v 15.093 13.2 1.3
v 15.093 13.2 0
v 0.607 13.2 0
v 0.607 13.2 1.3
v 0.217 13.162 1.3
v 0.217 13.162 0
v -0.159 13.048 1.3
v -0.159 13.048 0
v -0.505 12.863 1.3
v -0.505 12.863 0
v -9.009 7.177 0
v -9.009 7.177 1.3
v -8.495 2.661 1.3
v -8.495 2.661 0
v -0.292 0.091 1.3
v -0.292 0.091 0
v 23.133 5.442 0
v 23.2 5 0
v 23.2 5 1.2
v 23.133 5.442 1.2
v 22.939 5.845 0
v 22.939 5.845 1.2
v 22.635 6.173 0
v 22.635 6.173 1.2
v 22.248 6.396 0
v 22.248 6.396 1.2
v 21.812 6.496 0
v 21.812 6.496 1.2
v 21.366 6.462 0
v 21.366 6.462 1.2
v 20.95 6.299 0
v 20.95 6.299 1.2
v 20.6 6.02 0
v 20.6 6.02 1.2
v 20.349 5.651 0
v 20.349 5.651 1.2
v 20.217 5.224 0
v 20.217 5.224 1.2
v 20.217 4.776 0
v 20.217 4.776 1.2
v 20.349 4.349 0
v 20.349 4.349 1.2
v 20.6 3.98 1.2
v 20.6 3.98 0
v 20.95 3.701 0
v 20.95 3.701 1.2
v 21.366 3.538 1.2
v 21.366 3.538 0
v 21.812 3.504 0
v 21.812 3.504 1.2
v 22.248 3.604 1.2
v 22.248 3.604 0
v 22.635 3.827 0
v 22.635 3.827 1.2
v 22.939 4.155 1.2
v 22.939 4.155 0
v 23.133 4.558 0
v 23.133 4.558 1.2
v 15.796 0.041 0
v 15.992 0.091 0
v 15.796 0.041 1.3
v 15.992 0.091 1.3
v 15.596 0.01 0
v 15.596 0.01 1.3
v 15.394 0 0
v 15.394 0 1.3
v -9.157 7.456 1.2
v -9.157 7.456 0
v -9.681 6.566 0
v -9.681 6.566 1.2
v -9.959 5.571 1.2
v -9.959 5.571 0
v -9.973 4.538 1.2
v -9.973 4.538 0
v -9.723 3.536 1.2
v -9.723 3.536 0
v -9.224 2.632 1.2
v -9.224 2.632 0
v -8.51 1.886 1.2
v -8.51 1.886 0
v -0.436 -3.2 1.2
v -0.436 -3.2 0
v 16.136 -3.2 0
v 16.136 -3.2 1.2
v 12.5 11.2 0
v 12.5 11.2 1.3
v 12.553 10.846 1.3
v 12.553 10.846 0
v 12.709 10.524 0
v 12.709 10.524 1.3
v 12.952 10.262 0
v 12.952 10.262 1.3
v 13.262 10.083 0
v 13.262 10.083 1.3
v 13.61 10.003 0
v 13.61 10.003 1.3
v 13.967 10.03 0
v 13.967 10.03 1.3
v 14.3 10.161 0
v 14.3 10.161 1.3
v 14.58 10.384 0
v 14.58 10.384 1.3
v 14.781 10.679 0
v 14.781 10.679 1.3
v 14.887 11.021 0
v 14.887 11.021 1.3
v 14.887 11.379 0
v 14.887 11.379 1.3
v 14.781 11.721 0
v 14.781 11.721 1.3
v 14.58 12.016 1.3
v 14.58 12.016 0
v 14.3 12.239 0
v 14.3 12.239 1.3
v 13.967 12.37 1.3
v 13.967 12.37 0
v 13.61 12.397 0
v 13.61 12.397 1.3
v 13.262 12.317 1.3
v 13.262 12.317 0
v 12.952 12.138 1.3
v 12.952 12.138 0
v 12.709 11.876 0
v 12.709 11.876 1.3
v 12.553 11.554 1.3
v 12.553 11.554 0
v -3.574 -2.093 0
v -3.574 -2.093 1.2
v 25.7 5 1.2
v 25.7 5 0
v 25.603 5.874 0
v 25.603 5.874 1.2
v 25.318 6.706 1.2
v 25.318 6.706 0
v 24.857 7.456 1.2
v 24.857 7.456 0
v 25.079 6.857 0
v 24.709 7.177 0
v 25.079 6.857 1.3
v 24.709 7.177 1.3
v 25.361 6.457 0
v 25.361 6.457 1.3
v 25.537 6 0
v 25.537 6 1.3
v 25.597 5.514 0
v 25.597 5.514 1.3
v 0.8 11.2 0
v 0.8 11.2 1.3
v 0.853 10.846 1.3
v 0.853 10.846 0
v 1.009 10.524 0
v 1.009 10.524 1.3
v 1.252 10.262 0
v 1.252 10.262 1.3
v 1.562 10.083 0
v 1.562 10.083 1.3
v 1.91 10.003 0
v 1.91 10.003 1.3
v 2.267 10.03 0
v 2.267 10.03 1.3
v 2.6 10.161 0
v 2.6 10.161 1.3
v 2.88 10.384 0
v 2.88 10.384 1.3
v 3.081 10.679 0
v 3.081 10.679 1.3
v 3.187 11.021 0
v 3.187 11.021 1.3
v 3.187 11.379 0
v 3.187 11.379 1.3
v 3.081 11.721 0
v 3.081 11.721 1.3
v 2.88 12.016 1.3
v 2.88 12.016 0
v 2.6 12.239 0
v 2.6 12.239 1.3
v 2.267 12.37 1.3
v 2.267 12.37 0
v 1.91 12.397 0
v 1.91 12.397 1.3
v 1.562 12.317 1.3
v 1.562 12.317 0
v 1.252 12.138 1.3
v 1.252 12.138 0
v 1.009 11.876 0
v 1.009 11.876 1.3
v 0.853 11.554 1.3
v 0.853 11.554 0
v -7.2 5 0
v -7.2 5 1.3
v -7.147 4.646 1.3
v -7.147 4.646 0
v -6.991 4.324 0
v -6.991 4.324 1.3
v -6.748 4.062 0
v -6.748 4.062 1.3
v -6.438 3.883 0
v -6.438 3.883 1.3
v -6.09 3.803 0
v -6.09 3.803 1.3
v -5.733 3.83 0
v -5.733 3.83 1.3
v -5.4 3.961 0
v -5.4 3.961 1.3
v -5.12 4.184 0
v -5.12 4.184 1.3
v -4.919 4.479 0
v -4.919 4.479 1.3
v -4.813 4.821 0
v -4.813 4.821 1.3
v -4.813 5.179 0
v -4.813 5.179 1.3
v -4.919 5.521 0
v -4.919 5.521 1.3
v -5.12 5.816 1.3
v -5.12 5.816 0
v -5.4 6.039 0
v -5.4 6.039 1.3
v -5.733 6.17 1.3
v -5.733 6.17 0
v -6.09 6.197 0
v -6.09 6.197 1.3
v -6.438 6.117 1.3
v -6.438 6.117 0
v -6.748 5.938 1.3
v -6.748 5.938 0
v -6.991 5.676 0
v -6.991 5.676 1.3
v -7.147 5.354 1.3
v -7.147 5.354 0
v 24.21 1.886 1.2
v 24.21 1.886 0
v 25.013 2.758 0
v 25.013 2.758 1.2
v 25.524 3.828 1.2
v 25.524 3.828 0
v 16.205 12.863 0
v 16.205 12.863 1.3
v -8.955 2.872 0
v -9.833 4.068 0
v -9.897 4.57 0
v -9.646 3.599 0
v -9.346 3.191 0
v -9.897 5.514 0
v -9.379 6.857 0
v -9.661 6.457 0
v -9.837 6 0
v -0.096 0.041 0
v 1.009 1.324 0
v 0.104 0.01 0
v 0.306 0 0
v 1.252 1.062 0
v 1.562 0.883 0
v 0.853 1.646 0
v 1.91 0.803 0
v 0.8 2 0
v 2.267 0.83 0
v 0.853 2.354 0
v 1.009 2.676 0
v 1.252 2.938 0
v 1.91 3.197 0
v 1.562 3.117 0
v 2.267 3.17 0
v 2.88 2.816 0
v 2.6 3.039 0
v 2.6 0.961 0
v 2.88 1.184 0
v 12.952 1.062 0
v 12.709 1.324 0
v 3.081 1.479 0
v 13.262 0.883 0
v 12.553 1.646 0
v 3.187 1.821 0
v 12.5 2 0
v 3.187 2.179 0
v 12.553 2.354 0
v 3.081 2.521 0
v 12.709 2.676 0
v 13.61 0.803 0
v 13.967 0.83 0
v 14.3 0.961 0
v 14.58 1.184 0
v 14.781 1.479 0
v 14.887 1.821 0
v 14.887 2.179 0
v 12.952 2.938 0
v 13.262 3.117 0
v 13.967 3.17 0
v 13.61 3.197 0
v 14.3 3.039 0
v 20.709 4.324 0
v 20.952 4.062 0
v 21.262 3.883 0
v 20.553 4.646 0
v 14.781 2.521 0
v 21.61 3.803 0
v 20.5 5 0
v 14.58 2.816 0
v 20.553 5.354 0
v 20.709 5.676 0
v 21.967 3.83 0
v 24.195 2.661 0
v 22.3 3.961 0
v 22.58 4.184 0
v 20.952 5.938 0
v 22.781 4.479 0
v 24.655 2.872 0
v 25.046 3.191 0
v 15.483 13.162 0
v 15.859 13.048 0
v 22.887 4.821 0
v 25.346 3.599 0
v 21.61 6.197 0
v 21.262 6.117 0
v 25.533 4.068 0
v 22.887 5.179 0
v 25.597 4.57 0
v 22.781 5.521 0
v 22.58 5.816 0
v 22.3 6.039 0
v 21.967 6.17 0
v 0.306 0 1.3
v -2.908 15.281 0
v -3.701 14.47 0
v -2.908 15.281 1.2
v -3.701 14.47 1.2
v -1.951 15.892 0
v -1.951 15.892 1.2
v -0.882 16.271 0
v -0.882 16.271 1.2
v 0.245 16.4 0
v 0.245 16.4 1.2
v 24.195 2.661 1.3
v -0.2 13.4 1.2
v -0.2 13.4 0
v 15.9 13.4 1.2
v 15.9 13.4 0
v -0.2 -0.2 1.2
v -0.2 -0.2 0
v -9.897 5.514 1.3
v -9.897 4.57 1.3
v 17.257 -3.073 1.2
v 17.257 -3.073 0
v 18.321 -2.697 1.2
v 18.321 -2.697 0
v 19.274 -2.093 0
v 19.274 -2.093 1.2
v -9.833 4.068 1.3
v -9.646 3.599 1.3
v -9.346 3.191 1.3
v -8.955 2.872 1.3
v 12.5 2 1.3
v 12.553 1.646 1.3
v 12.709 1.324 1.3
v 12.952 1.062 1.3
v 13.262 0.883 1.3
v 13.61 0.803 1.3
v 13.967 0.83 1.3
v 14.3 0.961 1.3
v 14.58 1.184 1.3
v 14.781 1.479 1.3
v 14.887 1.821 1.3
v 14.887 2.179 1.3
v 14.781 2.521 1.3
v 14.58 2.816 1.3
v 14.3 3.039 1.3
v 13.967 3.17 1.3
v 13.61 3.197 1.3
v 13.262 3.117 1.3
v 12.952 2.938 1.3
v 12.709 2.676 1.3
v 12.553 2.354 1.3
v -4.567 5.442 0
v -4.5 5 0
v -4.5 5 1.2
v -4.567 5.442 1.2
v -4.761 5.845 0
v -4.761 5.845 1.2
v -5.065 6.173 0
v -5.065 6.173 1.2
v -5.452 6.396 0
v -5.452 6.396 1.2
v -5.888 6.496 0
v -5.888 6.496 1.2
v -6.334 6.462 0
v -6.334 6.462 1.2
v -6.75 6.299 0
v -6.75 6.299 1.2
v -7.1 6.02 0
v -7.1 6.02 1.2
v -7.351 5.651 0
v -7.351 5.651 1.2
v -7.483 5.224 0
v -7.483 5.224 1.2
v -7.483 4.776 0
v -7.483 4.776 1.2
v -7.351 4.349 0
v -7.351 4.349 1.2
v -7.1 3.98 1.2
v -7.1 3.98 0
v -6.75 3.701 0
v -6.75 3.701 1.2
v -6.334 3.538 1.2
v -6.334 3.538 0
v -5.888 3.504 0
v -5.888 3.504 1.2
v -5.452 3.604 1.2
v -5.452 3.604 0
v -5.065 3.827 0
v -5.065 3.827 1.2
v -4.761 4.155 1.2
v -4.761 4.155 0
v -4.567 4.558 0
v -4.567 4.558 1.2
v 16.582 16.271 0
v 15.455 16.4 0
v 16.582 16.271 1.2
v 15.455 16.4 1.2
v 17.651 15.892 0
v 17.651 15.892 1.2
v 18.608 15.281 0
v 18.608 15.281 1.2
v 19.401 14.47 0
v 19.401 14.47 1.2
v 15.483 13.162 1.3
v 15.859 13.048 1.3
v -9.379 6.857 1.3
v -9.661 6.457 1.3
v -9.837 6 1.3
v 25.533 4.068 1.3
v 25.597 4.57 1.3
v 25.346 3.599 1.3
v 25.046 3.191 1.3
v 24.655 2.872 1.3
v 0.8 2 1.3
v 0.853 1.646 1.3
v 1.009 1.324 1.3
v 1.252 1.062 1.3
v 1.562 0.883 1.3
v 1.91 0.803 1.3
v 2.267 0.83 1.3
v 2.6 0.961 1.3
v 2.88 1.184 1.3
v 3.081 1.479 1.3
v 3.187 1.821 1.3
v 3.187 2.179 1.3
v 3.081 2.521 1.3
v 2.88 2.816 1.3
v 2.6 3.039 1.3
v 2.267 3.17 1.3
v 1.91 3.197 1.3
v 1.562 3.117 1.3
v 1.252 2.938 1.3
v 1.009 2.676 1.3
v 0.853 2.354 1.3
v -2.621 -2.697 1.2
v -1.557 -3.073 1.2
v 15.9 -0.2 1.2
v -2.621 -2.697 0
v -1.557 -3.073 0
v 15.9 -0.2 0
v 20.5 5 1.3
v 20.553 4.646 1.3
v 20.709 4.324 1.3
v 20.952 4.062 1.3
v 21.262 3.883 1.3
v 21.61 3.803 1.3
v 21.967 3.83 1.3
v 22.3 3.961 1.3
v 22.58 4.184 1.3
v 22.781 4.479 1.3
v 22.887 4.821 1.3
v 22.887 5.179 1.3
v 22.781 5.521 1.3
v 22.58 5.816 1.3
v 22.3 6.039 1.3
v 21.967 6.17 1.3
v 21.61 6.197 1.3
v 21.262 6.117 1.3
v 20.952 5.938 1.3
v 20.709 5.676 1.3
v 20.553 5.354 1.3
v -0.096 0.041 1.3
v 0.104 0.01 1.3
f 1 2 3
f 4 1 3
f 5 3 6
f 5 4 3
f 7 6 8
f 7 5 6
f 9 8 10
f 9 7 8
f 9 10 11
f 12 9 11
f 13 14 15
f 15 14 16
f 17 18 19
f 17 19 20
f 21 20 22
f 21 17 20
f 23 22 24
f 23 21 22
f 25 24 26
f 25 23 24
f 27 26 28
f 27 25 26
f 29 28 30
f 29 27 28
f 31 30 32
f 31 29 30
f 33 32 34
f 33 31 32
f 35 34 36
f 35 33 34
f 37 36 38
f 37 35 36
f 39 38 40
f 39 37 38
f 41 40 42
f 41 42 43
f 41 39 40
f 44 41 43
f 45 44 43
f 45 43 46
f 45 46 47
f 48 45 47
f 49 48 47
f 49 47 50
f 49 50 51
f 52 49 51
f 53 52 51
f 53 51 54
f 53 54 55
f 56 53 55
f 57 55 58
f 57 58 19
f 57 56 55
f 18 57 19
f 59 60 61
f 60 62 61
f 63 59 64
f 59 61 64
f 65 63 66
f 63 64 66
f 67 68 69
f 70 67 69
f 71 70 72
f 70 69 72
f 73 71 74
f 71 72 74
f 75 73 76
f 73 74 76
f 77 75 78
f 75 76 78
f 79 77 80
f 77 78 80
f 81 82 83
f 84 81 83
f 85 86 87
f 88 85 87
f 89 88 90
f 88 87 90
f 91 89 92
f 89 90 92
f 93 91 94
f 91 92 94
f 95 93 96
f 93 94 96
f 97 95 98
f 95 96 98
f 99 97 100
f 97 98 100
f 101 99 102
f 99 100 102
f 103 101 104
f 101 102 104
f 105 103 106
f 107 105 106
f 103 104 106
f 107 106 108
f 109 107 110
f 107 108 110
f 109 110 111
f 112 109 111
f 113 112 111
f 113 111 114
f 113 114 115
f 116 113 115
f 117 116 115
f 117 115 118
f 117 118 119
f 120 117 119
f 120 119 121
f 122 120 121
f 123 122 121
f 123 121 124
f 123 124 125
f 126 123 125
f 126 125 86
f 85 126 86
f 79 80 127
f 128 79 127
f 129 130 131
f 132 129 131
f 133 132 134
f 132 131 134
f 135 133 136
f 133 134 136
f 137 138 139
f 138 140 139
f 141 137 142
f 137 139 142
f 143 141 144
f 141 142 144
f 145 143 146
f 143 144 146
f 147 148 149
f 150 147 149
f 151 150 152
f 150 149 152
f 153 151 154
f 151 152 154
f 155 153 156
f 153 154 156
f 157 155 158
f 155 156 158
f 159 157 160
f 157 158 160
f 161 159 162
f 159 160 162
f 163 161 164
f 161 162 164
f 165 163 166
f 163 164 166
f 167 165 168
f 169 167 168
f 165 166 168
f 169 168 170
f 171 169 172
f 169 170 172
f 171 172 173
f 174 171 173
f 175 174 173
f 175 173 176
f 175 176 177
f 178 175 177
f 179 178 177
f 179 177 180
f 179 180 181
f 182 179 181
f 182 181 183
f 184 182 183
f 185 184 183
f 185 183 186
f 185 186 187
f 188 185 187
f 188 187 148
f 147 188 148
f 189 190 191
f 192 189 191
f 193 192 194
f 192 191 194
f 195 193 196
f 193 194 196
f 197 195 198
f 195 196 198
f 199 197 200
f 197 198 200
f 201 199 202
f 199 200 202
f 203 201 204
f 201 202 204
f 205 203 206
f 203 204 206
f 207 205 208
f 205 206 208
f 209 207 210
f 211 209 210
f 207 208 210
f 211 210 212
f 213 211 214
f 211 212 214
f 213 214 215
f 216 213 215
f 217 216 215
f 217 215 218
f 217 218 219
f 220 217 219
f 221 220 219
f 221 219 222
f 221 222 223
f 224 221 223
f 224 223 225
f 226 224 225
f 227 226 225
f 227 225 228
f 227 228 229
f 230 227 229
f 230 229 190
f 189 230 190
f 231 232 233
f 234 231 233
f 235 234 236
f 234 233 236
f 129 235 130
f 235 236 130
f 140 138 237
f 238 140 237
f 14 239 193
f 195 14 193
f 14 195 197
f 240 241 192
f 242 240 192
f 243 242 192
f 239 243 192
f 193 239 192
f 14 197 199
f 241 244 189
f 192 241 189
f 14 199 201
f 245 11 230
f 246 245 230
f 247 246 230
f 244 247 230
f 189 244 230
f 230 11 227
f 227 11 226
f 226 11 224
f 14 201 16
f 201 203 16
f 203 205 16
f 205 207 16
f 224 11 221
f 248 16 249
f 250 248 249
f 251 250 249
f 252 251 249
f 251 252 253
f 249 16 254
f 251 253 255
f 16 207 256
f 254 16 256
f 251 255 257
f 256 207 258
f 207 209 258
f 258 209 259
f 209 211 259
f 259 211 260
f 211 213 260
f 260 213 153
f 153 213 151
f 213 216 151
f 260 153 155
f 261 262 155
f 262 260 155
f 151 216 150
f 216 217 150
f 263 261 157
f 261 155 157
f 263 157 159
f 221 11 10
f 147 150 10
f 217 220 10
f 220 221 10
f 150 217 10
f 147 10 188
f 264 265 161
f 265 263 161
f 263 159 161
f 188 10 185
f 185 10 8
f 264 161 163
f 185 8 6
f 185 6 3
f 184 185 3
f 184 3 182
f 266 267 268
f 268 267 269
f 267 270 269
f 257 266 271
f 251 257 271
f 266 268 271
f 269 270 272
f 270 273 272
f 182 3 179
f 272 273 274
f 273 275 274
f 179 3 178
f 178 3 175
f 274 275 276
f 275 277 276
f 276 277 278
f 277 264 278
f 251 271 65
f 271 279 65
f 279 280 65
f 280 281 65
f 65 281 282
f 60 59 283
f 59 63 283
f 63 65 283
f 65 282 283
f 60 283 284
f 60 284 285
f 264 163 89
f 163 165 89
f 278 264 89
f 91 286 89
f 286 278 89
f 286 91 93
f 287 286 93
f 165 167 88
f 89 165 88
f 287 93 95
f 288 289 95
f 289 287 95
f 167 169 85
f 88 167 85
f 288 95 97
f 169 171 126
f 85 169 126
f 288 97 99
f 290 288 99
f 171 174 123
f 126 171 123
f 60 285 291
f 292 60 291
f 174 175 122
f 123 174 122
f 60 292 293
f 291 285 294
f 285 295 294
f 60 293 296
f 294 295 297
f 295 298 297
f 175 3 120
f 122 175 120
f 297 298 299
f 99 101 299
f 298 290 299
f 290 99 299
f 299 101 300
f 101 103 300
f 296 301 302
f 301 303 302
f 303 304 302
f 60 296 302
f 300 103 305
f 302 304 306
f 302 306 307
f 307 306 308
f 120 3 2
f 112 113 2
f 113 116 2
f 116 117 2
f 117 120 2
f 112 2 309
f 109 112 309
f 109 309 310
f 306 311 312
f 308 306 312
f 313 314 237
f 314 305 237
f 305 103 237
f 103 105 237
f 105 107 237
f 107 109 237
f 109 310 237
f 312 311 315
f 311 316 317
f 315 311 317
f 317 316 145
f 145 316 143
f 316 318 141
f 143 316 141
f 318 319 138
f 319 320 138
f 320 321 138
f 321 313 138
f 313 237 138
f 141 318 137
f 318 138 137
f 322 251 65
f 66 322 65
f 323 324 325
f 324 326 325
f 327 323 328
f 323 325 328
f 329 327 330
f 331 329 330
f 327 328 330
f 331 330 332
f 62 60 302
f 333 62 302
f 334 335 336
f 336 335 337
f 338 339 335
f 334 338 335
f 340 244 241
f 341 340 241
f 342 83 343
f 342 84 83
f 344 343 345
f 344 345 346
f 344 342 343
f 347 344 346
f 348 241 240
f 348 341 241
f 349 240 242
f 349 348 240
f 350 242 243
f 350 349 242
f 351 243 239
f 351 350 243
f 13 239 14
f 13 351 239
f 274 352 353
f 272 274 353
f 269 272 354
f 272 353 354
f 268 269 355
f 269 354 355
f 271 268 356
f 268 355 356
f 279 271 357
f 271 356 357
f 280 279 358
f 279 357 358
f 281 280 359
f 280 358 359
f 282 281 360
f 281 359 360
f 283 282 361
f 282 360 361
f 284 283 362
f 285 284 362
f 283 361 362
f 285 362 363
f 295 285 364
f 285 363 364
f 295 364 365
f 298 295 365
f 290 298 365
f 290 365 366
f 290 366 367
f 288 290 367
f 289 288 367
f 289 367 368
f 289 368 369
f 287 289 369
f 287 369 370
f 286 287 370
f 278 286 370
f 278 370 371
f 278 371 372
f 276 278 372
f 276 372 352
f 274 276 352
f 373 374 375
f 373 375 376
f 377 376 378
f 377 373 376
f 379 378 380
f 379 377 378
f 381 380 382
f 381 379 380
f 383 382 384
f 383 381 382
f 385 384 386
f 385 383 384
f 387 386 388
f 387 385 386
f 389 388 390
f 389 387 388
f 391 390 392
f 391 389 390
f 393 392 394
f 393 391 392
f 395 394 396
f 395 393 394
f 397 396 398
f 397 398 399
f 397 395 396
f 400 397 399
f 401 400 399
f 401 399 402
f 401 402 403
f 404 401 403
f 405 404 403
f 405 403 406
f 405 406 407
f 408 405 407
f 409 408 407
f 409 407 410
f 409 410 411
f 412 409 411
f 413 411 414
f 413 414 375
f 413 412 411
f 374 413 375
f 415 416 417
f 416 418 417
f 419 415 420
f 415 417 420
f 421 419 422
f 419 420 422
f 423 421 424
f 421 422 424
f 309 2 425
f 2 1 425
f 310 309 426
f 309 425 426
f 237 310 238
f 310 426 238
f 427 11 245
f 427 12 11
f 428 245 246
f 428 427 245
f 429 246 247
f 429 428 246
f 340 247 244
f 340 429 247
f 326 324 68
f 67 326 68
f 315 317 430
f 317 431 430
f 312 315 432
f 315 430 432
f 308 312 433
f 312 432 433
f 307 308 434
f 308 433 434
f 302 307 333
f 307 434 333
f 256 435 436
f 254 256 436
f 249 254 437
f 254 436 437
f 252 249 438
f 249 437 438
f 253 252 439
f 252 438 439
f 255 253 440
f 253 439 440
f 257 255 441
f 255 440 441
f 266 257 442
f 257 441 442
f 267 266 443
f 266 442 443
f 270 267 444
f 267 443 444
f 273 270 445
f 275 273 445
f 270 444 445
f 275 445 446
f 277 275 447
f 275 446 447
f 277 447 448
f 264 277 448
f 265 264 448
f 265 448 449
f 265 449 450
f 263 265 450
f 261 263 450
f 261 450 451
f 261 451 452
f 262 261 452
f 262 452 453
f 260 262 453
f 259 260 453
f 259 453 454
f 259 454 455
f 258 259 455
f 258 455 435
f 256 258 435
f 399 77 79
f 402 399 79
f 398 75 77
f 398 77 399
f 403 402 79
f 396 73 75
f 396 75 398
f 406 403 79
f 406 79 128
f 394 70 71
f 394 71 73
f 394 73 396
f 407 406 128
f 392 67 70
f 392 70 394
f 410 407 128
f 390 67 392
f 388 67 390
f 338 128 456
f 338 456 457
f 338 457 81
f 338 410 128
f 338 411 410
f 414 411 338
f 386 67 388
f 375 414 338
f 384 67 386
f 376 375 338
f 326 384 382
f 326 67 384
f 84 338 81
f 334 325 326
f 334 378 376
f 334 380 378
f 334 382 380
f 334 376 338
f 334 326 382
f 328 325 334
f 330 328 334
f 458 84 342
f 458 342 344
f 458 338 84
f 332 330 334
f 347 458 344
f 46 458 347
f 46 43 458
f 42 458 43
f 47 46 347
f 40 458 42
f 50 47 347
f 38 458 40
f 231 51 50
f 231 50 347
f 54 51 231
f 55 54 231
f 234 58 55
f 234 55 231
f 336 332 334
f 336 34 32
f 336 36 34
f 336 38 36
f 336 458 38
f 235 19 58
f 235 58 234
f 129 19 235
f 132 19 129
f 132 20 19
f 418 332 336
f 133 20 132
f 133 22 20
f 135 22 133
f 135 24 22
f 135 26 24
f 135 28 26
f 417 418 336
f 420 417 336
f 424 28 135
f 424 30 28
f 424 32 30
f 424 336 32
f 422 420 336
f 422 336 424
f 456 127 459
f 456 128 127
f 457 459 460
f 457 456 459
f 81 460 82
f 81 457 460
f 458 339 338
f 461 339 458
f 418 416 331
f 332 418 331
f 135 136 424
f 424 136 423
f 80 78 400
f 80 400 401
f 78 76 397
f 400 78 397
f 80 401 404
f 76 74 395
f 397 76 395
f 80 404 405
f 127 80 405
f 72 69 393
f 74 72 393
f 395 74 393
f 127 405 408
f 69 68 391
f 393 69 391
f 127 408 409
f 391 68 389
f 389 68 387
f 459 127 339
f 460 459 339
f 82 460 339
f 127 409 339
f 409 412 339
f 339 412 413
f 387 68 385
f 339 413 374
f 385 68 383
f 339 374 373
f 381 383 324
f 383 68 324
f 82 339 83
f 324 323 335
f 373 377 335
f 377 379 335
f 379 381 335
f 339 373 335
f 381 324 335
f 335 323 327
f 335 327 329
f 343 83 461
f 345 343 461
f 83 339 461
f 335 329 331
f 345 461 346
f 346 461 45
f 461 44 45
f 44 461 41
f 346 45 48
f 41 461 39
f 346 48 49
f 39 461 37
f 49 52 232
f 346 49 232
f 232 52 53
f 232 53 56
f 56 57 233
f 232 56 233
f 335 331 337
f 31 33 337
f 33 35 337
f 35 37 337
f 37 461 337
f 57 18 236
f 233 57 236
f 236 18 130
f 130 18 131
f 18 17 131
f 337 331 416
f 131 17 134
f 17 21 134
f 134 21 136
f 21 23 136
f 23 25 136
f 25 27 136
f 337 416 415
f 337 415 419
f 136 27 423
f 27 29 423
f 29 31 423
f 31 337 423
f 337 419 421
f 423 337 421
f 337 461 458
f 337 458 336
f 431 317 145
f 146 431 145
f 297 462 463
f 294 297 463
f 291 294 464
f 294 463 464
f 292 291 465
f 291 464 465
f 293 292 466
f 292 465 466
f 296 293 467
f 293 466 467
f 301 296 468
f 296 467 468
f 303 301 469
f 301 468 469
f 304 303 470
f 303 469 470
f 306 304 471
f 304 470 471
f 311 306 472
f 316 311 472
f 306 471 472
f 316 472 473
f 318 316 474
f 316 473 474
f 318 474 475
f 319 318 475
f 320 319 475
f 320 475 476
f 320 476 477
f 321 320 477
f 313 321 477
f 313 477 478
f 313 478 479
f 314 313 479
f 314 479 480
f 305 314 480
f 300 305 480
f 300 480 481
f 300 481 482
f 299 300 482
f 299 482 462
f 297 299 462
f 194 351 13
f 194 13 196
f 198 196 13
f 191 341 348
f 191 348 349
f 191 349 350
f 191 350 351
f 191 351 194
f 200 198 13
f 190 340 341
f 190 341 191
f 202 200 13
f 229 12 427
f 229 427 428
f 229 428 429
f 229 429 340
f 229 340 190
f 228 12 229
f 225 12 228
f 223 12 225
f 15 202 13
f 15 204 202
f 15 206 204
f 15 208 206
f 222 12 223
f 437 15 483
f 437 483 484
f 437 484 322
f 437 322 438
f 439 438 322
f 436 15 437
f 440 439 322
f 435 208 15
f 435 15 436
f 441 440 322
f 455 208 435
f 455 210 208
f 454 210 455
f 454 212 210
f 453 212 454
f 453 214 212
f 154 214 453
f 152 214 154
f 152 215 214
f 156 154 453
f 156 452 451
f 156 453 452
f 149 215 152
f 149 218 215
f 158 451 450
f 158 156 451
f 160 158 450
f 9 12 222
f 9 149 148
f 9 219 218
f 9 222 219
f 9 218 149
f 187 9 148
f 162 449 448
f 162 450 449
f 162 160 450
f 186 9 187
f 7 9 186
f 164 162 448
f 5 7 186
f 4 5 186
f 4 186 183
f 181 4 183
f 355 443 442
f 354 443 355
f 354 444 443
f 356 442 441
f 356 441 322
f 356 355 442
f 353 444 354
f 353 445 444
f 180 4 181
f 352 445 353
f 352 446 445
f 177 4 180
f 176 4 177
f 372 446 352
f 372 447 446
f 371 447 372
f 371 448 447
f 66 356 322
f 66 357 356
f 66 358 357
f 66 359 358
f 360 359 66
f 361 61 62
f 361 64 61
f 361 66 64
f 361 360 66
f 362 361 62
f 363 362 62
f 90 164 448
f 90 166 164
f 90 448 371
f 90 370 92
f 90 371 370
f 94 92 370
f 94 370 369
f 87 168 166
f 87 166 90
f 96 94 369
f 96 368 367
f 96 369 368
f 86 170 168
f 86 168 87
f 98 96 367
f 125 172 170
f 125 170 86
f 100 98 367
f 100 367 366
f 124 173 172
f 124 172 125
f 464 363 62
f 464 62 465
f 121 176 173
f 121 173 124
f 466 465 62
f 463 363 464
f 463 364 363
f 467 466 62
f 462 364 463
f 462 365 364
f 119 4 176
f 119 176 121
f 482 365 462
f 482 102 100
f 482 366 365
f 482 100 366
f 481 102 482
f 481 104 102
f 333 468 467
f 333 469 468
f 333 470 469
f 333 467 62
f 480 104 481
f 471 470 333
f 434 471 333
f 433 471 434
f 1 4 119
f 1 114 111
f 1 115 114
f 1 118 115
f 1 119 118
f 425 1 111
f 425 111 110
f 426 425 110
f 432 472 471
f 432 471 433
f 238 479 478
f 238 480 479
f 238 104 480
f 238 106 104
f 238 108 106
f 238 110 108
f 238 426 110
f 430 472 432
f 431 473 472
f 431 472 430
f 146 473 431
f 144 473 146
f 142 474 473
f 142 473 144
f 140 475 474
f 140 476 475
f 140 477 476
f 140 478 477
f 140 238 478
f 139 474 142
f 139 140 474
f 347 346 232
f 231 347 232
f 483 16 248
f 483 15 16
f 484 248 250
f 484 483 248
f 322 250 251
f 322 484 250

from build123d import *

# Parameters (mm, degrees)
F2_DEPTH = 1.3
F3_D     = 2.4
F4_R     = 2
F5_R     = 1.5
F5_W     = 16.1
F5_H     = 13.6
F6_DEPTH = 1.2
F7_R     = 5


with BuildPart() as f2:
    # F1 (on Top) → F2 (new body)
    with BuildSketch(Plane.XY):
        Polygon((15.7, 13.2), (0, 13.2), (-9.8972053856, 6.5830028616), (-9.8972053856, 3.1002506148), (0, 0), (15.7, 0), (25.5972053856, 3.1002506148), (25.5972053856, 6.5830028616), align=None)
    extrude(amount=F2_DEPTH)

    # F3 (through all)
    with Locations(Plane(origin=(0, 0, 0), x_dir=(1, 0, 0), z_dir=(0, 0, -1))):
        with Locations((13.7, -11.2), (2, -11.2), (-6, -5), (2, -2), (13.7, -2), (21.7, -5)):
            Hole(F3_D / 2)

    # F4
    f4_edges = [f2.edges().sort_by_distance(p)[0] for p in [
        (-9.897205, 3.100251, 0.65),
        (-9.897205, 6.583003, 0.65),
        (0, 13.2, 0.65),
        (0, 0, 0.65),
        (15.7, 0, 0.65),
        (25.597205, 3.100251, 0.65),
        (25.597205, 6.583003, 0.65),
        (15.7, 13.2, 0.65),
    ]]
    fillet(f4_edges, radius=F4_R)


with BuildPart() as f6:
    # F5 (on Top) → F6 (new body)
    with BuildSketch(Plane.XY):
        with BuildLine():
            ThreePointArc((-8.5100598753, 1.885582009), (-4.273767035, 1.3916596959), (-2, 5))
            ThreePointArc((-2, 5), (-4.7017515555, 8.7834575426), (-9.1572754882, 7.4559339347))
            ThreePointArc((-9.1572754882, 7.4559339347), (-9.9732704004, 4.5383482638), (-8.5100598753, 1.885582009))
        make_face()
        with Locations((-6, 5)):
            Circle(F5_R, mode=Mode.SUBTRACT)
        with BuildLine():
            ThreePointArc((-9.1572754882, 7.4559339347), (-4.7017515555, 8.7834575426), (-2, 5))
            ThreePointArc((-2, 5), (-4.273767035, 1.3916596959), (-8.5100598753, 1.885582009))
            Line((-8.5100598753, 1.885582009), (-2.2, -3.2))
            Line((-2.2, -3.2), (17.9, -3.2))
            Line((17.9, -3.2), (24.2100598753, 1.885582009))
            ThreePointArc((24.2100598753, 1.885582009), (17.7267295996, 5.4616517362), (24.8572754882, 7.4559339347))
            Line((24.8572754882, 7.4559339347), (17.9, 16.4))
            Line((17.9, 16.4), (-2.2, 16.4))
            Line((-2.2, 16.4), (-9.1572754882, 7.4559339347))
        make_face()
        with Locations((7.85, 6.6)):
            Rectangle(F5_W, F5_H, mode=Mode.SUBTRACT)
        with BuildLine():
            ThreePointArc((25.7, 5), (25.4834575426, 6.2982484445), (24.8572754882, 7.4559339347))
            ThreePointArc((24.8572754882, 7.4559339347), (17.7267295996, 5.4616517362), (24.2100598753, 1.885582009))
            ThreePointArc((24.2100598753, 1.885582009), (25.3083403041, 3.273767035), (25.7, 5))
        make_face()
        with Locations((21.7, 5)):
            Circle(F5_R, mode=Mode.SUBTRACT)
    extrude(amount=F6_DEPTH)

    # F7
    f7_edges = [f6.edges().sort_by_distance(p)[0] for p in [
        (-2.2, -3.2, 0.6),
        (17.9, -3.2, 0.6),
        (17.9, 16.4, 0.6),
        (-2.2, 16.4, 0.6),
    ]]
    fillet(f7_edges, radius=F7_R)


solid = Compound([f2.part, f6.part])
